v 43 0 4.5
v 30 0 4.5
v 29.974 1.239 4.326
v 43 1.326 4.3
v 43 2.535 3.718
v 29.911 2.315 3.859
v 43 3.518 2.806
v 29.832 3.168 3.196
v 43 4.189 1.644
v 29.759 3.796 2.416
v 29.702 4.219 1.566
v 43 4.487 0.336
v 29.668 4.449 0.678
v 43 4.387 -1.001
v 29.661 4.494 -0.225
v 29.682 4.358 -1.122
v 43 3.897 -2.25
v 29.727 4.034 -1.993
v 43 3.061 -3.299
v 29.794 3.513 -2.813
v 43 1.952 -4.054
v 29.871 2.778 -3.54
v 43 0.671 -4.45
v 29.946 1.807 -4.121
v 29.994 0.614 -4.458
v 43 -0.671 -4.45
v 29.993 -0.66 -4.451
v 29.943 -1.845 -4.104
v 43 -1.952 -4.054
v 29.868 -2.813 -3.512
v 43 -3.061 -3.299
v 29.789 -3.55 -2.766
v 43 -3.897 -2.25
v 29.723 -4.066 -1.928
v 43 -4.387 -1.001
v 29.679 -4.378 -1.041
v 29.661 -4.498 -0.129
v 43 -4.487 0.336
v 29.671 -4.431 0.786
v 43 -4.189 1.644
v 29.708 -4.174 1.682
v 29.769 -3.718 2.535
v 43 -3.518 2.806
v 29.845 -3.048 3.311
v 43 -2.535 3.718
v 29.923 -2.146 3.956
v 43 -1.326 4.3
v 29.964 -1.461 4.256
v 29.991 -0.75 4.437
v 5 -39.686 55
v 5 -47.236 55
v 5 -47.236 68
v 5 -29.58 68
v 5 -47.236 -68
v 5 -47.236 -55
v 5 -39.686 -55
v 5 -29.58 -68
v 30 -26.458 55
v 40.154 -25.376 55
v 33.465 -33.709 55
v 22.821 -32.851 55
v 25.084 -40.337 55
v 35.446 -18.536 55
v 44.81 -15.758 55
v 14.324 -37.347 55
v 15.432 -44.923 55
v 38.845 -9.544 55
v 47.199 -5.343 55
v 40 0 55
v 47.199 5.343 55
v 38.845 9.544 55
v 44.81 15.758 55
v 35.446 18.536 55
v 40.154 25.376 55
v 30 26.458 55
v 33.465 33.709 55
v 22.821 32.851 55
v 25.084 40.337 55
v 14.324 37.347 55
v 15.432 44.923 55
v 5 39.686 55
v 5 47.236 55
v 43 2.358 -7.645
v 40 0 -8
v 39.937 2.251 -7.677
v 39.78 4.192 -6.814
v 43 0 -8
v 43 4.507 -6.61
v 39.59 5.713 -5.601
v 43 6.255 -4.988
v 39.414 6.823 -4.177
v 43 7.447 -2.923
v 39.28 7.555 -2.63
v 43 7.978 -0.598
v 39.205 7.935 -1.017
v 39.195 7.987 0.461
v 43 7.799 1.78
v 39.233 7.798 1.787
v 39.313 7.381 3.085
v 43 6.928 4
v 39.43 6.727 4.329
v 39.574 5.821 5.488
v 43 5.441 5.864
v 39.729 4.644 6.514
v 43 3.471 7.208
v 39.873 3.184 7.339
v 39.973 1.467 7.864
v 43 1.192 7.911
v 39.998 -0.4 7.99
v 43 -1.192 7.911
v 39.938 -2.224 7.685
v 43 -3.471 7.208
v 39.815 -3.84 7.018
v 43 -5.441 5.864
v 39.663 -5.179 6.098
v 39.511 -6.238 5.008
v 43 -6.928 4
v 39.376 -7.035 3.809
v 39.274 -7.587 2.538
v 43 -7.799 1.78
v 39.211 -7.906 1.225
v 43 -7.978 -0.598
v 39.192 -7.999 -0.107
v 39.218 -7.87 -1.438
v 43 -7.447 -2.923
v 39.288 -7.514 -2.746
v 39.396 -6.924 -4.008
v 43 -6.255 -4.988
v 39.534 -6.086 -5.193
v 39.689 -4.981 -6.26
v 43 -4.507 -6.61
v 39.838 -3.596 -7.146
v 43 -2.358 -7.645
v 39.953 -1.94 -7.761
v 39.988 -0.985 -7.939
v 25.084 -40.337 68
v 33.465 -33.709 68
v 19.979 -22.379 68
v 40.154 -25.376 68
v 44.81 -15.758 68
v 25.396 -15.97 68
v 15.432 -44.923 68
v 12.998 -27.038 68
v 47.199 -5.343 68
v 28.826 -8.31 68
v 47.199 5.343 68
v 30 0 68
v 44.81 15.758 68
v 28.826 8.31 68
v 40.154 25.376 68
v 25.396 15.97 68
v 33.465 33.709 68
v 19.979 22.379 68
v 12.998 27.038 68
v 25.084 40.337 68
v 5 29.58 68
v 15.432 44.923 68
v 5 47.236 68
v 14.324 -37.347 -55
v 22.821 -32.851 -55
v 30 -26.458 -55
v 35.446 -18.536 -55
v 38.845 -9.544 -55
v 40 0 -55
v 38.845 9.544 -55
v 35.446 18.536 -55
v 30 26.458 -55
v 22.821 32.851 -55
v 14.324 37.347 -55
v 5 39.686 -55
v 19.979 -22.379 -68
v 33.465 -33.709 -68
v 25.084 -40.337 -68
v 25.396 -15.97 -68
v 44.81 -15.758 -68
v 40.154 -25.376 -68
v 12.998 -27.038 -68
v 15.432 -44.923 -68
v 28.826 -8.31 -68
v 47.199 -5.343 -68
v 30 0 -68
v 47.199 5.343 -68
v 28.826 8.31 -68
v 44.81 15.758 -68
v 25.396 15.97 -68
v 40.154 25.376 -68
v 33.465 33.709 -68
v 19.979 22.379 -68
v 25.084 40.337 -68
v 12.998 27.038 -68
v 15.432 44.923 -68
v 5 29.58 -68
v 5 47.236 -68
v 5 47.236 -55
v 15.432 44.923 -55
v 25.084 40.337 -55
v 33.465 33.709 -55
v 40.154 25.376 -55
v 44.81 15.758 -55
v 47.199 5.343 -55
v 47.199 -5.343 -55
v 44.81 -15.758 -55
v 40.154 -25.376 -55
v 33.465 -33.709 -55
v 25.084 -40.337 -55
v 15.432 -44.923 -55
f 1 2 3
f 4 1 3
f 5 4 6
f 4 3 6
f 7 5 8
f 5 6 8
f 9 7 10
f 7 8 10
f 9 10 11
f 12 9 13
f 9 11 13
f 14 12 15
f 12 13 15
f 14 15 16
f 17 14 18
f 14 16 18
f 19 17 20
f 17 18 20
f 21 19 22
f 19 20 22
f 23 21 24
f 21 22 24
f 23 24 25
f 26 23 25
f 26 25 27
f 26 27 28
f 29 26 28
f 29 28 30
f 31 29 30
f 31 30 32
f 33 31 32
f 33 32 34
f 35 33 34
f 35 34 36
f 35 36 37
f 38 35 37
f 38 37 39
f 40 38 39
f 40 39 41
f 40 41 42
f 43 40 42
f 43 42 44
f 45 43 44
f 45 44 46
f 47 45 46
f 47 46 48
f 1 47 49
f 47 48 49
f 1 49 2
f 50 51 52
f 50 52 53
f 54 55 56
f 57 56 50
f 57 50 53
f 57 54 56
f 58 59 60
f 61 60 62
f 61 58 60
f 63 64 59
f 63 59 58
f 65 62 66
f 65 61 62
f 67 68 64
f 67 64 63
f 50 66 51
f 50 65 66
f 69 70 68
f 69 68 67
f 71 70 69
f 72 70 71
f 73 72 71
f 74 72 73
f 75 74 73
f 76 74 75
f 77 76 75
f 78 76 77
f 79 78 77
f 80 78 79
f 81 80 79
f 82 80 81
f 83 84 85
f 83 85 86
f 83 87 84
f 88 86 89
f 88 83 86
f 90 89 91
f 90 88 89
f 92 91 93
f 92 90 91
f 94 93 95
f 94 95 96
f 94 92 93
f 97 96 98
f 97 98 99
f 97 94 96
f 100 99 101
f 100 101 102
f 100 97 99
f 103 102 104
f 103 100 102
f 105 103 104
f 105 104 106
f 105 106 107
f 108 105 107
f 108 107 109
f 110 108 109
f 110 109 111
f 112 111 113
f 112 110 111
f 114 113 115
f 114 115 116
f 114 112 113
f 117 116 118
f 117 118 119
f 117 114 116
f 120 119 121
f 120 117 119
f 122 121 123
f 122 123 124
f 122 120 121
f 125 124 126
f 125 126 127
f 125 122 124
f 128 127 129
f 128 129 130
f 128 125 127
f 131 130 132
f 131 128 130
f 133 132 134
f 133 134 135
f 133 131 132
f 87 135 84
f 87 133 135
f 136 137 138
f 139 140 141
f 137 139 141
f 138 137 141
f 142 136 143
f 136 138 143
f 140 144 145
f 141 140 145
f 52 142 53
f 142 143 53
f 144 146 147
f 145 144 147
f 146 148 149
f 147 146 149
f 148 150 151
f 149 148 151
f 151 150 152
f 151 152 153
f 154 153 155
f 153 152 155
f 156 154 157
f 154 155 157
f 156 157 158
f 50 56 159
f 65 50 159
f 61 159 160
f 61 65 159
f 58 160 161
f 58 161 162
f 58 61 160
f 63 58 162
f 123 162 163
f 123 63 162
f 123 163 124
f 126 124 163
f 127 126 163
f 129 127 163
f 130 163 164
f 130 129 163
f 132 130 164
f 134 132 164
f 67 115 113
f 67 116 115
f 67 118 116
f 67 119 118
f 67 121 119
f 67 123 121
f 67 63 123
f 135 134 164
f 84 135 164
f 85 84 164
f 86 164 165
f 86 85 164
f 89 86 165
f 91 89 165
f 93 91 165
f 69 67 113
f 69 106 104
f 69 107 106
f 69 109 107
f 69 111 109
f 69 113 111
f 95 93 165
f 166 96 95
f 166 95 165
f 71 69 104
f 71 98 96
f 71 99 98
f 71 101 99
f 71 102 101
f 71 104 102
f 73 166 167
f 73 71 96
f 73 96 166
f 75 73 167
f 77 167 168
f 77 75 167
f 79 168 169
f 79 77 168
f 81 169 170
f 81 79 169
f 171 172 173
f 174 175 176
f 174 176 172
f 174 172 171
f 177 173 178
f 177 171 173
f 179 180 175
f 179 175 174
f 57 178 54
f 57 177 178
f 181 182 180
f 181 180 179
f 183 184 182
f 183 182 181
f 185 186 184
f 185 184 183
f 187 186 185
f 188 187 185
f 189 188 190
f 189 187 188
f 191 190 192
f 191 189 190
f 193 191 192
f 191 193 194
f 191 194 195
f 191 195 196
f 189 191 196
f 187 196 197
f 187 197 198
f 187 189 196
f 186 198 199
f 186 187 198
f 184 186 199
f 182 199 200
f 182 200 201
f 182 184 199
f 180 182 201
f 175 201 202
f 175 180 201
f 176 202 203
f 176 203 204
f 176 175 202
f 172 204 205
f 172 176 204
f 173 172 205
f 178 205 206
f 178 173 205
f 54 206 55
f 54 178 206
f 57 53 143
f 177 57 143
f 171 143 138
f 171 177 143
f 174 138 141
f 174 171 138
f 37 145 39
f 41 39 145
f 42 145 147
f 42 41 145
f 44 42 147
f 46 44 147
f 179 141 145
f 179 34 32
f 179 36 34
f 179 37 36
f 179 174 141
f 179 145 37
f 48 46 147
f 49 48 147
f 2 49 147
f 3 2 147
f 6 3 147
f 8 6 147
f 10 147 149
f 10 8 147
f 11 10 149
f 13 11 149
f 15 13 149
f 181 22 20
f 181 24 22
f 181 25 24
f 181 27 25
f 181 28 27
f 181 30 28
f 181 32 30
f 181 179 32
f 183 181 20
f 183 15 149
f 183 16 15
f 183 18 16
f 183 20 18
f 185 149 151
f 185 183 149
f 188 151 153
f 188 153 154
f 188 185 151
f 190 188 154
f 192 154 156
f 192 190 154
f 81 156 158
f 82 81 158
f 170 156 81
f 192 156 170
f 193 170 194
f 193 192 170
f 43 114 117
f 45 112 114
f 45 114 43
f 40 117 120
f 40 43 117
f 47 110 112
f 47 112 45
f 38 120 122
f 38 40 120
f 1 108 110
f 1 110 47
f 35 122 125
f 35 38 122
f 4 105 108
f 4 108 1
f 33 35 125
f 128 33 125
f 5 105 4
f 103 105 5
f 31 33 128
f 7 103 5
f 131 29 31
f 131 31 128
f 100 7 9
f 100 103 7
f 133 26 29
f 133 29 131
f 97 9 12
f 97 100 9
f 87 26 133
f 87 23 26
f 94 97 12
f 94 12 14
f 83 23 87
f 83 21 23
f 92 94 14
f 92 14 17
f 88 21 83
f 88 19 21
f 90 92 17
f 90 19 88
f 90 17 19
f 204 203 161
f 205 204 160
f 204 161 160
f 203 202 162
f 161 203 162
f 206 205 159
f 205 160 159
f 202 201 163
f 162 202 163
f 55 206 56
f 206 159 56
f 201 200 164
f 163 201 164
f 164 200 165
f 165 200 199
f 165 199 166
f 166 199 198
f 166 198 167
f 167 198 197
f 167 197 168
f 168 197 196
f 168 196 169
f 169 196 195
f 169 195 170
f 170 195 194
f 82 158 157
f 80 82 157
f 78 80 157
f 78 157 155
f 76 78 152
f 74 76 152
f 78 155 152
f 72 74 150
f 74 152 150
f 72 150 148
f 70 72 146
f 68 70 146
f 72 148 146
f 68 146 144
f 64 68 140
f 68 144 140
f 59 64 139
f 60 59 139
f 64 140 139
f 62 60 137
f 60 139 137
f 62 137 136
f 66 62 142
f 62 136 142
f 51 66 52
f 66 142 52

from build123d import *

# Parameters (mm, degrees)
BOSS_EXTRUDE1_DEPTH      = 55
BOSS_EXTRUDE2_START      = 13
BOSS_EXTRUDE2_DEPTH      = 13
BOSS_EXTRUDE3_REACH      = 93.1
BOSS_EXTRUDE3_END_RADIUS = 40
SKETCH3_R                = 8
HOLE1_D                  = 9


with BuildPart() as part:
    # Sketch1 → Boss-Extrude1 (new, symmetric)
    with BuildSketch(Plane.XY):
        with BuildLine():
            Line((5, 39.686269666), (5, 29.580398915))
            ThreePointArc((5, 29.580398915), (30, 0), (5, -29.580398915))
            Line((5, -29.580398915), (5, -39.686269666))
            ThreePointArc((5, -39.686269666), (40, 0), (5, 39.686269666))
        make_face()
    extrude(amount=BOSS_EXTRUDE1_DEPTH, both=True)

    # Sketch2 → Boss-Extrude2 (add)
    with BuildSketch(Plane.XY.offset(55).offset(BOSS_EXTRUDE2_START)):
        with BuildLine():
            Line((5, 29.580398915), (5, 47.236109069))
            ThreePointArc((5, 47.236109069), (47.5, 0), (5, -47.236109069))
            Line((5, -47.236109069), (5, -29.580398915))
            ThreePointArc((5, -29.580398915), (30, 0), (5, 29.580398915))
        make_face()
    boss_extrude2 = extrude(amount=-BOSS_EXTRUDE2_DEPTH)

    # Mirror1: Boss-Extrude2 across plane
    add(boss_extrude2.mirror(Plane.XY))

    # Boss-Extrude3: up to this cylinder (the profile starts outside it)
    boss_extrude3_end = Plane(origin=(0, 0, 0), z_dir=(0, 0, -1)) * Cylinder(BOSS_EXTRUDE3_END_RADIUS, 267.2, mode=Mode.PRIVATE)
    # Sketch3 → Boss-Extrude3 (add, up to the surface)
    with BuildSketch(Plane(origin=(43, 0, 0), x_dir=(0, 0, -1), z_dir=(1, 0, 0)), mode=Mode.PRIVATE) as boss_extrude3_sk1:
        Circle(SKETCH3_R)
    boss_extrude3_tool1 = extrude(boss_extrude3_sk1.sketch, amount=-BOSS_EXTRUDE3_REACH, mode=Mode.PRIVATE) - boss_extrude3_end
    add(boss_extrude3_tool1.solids().sort_by_distance((43, 0, 0))[0])

    # Hole1 (through all)
    with Locations(Plane(origin=(43, 0, 0), x_dir=(0, 0, -1), z_dir=(1, 0, 0))):
        with Locations((0, 0)):
            Hole(HOLE1_D / 2)


solid = part.part
